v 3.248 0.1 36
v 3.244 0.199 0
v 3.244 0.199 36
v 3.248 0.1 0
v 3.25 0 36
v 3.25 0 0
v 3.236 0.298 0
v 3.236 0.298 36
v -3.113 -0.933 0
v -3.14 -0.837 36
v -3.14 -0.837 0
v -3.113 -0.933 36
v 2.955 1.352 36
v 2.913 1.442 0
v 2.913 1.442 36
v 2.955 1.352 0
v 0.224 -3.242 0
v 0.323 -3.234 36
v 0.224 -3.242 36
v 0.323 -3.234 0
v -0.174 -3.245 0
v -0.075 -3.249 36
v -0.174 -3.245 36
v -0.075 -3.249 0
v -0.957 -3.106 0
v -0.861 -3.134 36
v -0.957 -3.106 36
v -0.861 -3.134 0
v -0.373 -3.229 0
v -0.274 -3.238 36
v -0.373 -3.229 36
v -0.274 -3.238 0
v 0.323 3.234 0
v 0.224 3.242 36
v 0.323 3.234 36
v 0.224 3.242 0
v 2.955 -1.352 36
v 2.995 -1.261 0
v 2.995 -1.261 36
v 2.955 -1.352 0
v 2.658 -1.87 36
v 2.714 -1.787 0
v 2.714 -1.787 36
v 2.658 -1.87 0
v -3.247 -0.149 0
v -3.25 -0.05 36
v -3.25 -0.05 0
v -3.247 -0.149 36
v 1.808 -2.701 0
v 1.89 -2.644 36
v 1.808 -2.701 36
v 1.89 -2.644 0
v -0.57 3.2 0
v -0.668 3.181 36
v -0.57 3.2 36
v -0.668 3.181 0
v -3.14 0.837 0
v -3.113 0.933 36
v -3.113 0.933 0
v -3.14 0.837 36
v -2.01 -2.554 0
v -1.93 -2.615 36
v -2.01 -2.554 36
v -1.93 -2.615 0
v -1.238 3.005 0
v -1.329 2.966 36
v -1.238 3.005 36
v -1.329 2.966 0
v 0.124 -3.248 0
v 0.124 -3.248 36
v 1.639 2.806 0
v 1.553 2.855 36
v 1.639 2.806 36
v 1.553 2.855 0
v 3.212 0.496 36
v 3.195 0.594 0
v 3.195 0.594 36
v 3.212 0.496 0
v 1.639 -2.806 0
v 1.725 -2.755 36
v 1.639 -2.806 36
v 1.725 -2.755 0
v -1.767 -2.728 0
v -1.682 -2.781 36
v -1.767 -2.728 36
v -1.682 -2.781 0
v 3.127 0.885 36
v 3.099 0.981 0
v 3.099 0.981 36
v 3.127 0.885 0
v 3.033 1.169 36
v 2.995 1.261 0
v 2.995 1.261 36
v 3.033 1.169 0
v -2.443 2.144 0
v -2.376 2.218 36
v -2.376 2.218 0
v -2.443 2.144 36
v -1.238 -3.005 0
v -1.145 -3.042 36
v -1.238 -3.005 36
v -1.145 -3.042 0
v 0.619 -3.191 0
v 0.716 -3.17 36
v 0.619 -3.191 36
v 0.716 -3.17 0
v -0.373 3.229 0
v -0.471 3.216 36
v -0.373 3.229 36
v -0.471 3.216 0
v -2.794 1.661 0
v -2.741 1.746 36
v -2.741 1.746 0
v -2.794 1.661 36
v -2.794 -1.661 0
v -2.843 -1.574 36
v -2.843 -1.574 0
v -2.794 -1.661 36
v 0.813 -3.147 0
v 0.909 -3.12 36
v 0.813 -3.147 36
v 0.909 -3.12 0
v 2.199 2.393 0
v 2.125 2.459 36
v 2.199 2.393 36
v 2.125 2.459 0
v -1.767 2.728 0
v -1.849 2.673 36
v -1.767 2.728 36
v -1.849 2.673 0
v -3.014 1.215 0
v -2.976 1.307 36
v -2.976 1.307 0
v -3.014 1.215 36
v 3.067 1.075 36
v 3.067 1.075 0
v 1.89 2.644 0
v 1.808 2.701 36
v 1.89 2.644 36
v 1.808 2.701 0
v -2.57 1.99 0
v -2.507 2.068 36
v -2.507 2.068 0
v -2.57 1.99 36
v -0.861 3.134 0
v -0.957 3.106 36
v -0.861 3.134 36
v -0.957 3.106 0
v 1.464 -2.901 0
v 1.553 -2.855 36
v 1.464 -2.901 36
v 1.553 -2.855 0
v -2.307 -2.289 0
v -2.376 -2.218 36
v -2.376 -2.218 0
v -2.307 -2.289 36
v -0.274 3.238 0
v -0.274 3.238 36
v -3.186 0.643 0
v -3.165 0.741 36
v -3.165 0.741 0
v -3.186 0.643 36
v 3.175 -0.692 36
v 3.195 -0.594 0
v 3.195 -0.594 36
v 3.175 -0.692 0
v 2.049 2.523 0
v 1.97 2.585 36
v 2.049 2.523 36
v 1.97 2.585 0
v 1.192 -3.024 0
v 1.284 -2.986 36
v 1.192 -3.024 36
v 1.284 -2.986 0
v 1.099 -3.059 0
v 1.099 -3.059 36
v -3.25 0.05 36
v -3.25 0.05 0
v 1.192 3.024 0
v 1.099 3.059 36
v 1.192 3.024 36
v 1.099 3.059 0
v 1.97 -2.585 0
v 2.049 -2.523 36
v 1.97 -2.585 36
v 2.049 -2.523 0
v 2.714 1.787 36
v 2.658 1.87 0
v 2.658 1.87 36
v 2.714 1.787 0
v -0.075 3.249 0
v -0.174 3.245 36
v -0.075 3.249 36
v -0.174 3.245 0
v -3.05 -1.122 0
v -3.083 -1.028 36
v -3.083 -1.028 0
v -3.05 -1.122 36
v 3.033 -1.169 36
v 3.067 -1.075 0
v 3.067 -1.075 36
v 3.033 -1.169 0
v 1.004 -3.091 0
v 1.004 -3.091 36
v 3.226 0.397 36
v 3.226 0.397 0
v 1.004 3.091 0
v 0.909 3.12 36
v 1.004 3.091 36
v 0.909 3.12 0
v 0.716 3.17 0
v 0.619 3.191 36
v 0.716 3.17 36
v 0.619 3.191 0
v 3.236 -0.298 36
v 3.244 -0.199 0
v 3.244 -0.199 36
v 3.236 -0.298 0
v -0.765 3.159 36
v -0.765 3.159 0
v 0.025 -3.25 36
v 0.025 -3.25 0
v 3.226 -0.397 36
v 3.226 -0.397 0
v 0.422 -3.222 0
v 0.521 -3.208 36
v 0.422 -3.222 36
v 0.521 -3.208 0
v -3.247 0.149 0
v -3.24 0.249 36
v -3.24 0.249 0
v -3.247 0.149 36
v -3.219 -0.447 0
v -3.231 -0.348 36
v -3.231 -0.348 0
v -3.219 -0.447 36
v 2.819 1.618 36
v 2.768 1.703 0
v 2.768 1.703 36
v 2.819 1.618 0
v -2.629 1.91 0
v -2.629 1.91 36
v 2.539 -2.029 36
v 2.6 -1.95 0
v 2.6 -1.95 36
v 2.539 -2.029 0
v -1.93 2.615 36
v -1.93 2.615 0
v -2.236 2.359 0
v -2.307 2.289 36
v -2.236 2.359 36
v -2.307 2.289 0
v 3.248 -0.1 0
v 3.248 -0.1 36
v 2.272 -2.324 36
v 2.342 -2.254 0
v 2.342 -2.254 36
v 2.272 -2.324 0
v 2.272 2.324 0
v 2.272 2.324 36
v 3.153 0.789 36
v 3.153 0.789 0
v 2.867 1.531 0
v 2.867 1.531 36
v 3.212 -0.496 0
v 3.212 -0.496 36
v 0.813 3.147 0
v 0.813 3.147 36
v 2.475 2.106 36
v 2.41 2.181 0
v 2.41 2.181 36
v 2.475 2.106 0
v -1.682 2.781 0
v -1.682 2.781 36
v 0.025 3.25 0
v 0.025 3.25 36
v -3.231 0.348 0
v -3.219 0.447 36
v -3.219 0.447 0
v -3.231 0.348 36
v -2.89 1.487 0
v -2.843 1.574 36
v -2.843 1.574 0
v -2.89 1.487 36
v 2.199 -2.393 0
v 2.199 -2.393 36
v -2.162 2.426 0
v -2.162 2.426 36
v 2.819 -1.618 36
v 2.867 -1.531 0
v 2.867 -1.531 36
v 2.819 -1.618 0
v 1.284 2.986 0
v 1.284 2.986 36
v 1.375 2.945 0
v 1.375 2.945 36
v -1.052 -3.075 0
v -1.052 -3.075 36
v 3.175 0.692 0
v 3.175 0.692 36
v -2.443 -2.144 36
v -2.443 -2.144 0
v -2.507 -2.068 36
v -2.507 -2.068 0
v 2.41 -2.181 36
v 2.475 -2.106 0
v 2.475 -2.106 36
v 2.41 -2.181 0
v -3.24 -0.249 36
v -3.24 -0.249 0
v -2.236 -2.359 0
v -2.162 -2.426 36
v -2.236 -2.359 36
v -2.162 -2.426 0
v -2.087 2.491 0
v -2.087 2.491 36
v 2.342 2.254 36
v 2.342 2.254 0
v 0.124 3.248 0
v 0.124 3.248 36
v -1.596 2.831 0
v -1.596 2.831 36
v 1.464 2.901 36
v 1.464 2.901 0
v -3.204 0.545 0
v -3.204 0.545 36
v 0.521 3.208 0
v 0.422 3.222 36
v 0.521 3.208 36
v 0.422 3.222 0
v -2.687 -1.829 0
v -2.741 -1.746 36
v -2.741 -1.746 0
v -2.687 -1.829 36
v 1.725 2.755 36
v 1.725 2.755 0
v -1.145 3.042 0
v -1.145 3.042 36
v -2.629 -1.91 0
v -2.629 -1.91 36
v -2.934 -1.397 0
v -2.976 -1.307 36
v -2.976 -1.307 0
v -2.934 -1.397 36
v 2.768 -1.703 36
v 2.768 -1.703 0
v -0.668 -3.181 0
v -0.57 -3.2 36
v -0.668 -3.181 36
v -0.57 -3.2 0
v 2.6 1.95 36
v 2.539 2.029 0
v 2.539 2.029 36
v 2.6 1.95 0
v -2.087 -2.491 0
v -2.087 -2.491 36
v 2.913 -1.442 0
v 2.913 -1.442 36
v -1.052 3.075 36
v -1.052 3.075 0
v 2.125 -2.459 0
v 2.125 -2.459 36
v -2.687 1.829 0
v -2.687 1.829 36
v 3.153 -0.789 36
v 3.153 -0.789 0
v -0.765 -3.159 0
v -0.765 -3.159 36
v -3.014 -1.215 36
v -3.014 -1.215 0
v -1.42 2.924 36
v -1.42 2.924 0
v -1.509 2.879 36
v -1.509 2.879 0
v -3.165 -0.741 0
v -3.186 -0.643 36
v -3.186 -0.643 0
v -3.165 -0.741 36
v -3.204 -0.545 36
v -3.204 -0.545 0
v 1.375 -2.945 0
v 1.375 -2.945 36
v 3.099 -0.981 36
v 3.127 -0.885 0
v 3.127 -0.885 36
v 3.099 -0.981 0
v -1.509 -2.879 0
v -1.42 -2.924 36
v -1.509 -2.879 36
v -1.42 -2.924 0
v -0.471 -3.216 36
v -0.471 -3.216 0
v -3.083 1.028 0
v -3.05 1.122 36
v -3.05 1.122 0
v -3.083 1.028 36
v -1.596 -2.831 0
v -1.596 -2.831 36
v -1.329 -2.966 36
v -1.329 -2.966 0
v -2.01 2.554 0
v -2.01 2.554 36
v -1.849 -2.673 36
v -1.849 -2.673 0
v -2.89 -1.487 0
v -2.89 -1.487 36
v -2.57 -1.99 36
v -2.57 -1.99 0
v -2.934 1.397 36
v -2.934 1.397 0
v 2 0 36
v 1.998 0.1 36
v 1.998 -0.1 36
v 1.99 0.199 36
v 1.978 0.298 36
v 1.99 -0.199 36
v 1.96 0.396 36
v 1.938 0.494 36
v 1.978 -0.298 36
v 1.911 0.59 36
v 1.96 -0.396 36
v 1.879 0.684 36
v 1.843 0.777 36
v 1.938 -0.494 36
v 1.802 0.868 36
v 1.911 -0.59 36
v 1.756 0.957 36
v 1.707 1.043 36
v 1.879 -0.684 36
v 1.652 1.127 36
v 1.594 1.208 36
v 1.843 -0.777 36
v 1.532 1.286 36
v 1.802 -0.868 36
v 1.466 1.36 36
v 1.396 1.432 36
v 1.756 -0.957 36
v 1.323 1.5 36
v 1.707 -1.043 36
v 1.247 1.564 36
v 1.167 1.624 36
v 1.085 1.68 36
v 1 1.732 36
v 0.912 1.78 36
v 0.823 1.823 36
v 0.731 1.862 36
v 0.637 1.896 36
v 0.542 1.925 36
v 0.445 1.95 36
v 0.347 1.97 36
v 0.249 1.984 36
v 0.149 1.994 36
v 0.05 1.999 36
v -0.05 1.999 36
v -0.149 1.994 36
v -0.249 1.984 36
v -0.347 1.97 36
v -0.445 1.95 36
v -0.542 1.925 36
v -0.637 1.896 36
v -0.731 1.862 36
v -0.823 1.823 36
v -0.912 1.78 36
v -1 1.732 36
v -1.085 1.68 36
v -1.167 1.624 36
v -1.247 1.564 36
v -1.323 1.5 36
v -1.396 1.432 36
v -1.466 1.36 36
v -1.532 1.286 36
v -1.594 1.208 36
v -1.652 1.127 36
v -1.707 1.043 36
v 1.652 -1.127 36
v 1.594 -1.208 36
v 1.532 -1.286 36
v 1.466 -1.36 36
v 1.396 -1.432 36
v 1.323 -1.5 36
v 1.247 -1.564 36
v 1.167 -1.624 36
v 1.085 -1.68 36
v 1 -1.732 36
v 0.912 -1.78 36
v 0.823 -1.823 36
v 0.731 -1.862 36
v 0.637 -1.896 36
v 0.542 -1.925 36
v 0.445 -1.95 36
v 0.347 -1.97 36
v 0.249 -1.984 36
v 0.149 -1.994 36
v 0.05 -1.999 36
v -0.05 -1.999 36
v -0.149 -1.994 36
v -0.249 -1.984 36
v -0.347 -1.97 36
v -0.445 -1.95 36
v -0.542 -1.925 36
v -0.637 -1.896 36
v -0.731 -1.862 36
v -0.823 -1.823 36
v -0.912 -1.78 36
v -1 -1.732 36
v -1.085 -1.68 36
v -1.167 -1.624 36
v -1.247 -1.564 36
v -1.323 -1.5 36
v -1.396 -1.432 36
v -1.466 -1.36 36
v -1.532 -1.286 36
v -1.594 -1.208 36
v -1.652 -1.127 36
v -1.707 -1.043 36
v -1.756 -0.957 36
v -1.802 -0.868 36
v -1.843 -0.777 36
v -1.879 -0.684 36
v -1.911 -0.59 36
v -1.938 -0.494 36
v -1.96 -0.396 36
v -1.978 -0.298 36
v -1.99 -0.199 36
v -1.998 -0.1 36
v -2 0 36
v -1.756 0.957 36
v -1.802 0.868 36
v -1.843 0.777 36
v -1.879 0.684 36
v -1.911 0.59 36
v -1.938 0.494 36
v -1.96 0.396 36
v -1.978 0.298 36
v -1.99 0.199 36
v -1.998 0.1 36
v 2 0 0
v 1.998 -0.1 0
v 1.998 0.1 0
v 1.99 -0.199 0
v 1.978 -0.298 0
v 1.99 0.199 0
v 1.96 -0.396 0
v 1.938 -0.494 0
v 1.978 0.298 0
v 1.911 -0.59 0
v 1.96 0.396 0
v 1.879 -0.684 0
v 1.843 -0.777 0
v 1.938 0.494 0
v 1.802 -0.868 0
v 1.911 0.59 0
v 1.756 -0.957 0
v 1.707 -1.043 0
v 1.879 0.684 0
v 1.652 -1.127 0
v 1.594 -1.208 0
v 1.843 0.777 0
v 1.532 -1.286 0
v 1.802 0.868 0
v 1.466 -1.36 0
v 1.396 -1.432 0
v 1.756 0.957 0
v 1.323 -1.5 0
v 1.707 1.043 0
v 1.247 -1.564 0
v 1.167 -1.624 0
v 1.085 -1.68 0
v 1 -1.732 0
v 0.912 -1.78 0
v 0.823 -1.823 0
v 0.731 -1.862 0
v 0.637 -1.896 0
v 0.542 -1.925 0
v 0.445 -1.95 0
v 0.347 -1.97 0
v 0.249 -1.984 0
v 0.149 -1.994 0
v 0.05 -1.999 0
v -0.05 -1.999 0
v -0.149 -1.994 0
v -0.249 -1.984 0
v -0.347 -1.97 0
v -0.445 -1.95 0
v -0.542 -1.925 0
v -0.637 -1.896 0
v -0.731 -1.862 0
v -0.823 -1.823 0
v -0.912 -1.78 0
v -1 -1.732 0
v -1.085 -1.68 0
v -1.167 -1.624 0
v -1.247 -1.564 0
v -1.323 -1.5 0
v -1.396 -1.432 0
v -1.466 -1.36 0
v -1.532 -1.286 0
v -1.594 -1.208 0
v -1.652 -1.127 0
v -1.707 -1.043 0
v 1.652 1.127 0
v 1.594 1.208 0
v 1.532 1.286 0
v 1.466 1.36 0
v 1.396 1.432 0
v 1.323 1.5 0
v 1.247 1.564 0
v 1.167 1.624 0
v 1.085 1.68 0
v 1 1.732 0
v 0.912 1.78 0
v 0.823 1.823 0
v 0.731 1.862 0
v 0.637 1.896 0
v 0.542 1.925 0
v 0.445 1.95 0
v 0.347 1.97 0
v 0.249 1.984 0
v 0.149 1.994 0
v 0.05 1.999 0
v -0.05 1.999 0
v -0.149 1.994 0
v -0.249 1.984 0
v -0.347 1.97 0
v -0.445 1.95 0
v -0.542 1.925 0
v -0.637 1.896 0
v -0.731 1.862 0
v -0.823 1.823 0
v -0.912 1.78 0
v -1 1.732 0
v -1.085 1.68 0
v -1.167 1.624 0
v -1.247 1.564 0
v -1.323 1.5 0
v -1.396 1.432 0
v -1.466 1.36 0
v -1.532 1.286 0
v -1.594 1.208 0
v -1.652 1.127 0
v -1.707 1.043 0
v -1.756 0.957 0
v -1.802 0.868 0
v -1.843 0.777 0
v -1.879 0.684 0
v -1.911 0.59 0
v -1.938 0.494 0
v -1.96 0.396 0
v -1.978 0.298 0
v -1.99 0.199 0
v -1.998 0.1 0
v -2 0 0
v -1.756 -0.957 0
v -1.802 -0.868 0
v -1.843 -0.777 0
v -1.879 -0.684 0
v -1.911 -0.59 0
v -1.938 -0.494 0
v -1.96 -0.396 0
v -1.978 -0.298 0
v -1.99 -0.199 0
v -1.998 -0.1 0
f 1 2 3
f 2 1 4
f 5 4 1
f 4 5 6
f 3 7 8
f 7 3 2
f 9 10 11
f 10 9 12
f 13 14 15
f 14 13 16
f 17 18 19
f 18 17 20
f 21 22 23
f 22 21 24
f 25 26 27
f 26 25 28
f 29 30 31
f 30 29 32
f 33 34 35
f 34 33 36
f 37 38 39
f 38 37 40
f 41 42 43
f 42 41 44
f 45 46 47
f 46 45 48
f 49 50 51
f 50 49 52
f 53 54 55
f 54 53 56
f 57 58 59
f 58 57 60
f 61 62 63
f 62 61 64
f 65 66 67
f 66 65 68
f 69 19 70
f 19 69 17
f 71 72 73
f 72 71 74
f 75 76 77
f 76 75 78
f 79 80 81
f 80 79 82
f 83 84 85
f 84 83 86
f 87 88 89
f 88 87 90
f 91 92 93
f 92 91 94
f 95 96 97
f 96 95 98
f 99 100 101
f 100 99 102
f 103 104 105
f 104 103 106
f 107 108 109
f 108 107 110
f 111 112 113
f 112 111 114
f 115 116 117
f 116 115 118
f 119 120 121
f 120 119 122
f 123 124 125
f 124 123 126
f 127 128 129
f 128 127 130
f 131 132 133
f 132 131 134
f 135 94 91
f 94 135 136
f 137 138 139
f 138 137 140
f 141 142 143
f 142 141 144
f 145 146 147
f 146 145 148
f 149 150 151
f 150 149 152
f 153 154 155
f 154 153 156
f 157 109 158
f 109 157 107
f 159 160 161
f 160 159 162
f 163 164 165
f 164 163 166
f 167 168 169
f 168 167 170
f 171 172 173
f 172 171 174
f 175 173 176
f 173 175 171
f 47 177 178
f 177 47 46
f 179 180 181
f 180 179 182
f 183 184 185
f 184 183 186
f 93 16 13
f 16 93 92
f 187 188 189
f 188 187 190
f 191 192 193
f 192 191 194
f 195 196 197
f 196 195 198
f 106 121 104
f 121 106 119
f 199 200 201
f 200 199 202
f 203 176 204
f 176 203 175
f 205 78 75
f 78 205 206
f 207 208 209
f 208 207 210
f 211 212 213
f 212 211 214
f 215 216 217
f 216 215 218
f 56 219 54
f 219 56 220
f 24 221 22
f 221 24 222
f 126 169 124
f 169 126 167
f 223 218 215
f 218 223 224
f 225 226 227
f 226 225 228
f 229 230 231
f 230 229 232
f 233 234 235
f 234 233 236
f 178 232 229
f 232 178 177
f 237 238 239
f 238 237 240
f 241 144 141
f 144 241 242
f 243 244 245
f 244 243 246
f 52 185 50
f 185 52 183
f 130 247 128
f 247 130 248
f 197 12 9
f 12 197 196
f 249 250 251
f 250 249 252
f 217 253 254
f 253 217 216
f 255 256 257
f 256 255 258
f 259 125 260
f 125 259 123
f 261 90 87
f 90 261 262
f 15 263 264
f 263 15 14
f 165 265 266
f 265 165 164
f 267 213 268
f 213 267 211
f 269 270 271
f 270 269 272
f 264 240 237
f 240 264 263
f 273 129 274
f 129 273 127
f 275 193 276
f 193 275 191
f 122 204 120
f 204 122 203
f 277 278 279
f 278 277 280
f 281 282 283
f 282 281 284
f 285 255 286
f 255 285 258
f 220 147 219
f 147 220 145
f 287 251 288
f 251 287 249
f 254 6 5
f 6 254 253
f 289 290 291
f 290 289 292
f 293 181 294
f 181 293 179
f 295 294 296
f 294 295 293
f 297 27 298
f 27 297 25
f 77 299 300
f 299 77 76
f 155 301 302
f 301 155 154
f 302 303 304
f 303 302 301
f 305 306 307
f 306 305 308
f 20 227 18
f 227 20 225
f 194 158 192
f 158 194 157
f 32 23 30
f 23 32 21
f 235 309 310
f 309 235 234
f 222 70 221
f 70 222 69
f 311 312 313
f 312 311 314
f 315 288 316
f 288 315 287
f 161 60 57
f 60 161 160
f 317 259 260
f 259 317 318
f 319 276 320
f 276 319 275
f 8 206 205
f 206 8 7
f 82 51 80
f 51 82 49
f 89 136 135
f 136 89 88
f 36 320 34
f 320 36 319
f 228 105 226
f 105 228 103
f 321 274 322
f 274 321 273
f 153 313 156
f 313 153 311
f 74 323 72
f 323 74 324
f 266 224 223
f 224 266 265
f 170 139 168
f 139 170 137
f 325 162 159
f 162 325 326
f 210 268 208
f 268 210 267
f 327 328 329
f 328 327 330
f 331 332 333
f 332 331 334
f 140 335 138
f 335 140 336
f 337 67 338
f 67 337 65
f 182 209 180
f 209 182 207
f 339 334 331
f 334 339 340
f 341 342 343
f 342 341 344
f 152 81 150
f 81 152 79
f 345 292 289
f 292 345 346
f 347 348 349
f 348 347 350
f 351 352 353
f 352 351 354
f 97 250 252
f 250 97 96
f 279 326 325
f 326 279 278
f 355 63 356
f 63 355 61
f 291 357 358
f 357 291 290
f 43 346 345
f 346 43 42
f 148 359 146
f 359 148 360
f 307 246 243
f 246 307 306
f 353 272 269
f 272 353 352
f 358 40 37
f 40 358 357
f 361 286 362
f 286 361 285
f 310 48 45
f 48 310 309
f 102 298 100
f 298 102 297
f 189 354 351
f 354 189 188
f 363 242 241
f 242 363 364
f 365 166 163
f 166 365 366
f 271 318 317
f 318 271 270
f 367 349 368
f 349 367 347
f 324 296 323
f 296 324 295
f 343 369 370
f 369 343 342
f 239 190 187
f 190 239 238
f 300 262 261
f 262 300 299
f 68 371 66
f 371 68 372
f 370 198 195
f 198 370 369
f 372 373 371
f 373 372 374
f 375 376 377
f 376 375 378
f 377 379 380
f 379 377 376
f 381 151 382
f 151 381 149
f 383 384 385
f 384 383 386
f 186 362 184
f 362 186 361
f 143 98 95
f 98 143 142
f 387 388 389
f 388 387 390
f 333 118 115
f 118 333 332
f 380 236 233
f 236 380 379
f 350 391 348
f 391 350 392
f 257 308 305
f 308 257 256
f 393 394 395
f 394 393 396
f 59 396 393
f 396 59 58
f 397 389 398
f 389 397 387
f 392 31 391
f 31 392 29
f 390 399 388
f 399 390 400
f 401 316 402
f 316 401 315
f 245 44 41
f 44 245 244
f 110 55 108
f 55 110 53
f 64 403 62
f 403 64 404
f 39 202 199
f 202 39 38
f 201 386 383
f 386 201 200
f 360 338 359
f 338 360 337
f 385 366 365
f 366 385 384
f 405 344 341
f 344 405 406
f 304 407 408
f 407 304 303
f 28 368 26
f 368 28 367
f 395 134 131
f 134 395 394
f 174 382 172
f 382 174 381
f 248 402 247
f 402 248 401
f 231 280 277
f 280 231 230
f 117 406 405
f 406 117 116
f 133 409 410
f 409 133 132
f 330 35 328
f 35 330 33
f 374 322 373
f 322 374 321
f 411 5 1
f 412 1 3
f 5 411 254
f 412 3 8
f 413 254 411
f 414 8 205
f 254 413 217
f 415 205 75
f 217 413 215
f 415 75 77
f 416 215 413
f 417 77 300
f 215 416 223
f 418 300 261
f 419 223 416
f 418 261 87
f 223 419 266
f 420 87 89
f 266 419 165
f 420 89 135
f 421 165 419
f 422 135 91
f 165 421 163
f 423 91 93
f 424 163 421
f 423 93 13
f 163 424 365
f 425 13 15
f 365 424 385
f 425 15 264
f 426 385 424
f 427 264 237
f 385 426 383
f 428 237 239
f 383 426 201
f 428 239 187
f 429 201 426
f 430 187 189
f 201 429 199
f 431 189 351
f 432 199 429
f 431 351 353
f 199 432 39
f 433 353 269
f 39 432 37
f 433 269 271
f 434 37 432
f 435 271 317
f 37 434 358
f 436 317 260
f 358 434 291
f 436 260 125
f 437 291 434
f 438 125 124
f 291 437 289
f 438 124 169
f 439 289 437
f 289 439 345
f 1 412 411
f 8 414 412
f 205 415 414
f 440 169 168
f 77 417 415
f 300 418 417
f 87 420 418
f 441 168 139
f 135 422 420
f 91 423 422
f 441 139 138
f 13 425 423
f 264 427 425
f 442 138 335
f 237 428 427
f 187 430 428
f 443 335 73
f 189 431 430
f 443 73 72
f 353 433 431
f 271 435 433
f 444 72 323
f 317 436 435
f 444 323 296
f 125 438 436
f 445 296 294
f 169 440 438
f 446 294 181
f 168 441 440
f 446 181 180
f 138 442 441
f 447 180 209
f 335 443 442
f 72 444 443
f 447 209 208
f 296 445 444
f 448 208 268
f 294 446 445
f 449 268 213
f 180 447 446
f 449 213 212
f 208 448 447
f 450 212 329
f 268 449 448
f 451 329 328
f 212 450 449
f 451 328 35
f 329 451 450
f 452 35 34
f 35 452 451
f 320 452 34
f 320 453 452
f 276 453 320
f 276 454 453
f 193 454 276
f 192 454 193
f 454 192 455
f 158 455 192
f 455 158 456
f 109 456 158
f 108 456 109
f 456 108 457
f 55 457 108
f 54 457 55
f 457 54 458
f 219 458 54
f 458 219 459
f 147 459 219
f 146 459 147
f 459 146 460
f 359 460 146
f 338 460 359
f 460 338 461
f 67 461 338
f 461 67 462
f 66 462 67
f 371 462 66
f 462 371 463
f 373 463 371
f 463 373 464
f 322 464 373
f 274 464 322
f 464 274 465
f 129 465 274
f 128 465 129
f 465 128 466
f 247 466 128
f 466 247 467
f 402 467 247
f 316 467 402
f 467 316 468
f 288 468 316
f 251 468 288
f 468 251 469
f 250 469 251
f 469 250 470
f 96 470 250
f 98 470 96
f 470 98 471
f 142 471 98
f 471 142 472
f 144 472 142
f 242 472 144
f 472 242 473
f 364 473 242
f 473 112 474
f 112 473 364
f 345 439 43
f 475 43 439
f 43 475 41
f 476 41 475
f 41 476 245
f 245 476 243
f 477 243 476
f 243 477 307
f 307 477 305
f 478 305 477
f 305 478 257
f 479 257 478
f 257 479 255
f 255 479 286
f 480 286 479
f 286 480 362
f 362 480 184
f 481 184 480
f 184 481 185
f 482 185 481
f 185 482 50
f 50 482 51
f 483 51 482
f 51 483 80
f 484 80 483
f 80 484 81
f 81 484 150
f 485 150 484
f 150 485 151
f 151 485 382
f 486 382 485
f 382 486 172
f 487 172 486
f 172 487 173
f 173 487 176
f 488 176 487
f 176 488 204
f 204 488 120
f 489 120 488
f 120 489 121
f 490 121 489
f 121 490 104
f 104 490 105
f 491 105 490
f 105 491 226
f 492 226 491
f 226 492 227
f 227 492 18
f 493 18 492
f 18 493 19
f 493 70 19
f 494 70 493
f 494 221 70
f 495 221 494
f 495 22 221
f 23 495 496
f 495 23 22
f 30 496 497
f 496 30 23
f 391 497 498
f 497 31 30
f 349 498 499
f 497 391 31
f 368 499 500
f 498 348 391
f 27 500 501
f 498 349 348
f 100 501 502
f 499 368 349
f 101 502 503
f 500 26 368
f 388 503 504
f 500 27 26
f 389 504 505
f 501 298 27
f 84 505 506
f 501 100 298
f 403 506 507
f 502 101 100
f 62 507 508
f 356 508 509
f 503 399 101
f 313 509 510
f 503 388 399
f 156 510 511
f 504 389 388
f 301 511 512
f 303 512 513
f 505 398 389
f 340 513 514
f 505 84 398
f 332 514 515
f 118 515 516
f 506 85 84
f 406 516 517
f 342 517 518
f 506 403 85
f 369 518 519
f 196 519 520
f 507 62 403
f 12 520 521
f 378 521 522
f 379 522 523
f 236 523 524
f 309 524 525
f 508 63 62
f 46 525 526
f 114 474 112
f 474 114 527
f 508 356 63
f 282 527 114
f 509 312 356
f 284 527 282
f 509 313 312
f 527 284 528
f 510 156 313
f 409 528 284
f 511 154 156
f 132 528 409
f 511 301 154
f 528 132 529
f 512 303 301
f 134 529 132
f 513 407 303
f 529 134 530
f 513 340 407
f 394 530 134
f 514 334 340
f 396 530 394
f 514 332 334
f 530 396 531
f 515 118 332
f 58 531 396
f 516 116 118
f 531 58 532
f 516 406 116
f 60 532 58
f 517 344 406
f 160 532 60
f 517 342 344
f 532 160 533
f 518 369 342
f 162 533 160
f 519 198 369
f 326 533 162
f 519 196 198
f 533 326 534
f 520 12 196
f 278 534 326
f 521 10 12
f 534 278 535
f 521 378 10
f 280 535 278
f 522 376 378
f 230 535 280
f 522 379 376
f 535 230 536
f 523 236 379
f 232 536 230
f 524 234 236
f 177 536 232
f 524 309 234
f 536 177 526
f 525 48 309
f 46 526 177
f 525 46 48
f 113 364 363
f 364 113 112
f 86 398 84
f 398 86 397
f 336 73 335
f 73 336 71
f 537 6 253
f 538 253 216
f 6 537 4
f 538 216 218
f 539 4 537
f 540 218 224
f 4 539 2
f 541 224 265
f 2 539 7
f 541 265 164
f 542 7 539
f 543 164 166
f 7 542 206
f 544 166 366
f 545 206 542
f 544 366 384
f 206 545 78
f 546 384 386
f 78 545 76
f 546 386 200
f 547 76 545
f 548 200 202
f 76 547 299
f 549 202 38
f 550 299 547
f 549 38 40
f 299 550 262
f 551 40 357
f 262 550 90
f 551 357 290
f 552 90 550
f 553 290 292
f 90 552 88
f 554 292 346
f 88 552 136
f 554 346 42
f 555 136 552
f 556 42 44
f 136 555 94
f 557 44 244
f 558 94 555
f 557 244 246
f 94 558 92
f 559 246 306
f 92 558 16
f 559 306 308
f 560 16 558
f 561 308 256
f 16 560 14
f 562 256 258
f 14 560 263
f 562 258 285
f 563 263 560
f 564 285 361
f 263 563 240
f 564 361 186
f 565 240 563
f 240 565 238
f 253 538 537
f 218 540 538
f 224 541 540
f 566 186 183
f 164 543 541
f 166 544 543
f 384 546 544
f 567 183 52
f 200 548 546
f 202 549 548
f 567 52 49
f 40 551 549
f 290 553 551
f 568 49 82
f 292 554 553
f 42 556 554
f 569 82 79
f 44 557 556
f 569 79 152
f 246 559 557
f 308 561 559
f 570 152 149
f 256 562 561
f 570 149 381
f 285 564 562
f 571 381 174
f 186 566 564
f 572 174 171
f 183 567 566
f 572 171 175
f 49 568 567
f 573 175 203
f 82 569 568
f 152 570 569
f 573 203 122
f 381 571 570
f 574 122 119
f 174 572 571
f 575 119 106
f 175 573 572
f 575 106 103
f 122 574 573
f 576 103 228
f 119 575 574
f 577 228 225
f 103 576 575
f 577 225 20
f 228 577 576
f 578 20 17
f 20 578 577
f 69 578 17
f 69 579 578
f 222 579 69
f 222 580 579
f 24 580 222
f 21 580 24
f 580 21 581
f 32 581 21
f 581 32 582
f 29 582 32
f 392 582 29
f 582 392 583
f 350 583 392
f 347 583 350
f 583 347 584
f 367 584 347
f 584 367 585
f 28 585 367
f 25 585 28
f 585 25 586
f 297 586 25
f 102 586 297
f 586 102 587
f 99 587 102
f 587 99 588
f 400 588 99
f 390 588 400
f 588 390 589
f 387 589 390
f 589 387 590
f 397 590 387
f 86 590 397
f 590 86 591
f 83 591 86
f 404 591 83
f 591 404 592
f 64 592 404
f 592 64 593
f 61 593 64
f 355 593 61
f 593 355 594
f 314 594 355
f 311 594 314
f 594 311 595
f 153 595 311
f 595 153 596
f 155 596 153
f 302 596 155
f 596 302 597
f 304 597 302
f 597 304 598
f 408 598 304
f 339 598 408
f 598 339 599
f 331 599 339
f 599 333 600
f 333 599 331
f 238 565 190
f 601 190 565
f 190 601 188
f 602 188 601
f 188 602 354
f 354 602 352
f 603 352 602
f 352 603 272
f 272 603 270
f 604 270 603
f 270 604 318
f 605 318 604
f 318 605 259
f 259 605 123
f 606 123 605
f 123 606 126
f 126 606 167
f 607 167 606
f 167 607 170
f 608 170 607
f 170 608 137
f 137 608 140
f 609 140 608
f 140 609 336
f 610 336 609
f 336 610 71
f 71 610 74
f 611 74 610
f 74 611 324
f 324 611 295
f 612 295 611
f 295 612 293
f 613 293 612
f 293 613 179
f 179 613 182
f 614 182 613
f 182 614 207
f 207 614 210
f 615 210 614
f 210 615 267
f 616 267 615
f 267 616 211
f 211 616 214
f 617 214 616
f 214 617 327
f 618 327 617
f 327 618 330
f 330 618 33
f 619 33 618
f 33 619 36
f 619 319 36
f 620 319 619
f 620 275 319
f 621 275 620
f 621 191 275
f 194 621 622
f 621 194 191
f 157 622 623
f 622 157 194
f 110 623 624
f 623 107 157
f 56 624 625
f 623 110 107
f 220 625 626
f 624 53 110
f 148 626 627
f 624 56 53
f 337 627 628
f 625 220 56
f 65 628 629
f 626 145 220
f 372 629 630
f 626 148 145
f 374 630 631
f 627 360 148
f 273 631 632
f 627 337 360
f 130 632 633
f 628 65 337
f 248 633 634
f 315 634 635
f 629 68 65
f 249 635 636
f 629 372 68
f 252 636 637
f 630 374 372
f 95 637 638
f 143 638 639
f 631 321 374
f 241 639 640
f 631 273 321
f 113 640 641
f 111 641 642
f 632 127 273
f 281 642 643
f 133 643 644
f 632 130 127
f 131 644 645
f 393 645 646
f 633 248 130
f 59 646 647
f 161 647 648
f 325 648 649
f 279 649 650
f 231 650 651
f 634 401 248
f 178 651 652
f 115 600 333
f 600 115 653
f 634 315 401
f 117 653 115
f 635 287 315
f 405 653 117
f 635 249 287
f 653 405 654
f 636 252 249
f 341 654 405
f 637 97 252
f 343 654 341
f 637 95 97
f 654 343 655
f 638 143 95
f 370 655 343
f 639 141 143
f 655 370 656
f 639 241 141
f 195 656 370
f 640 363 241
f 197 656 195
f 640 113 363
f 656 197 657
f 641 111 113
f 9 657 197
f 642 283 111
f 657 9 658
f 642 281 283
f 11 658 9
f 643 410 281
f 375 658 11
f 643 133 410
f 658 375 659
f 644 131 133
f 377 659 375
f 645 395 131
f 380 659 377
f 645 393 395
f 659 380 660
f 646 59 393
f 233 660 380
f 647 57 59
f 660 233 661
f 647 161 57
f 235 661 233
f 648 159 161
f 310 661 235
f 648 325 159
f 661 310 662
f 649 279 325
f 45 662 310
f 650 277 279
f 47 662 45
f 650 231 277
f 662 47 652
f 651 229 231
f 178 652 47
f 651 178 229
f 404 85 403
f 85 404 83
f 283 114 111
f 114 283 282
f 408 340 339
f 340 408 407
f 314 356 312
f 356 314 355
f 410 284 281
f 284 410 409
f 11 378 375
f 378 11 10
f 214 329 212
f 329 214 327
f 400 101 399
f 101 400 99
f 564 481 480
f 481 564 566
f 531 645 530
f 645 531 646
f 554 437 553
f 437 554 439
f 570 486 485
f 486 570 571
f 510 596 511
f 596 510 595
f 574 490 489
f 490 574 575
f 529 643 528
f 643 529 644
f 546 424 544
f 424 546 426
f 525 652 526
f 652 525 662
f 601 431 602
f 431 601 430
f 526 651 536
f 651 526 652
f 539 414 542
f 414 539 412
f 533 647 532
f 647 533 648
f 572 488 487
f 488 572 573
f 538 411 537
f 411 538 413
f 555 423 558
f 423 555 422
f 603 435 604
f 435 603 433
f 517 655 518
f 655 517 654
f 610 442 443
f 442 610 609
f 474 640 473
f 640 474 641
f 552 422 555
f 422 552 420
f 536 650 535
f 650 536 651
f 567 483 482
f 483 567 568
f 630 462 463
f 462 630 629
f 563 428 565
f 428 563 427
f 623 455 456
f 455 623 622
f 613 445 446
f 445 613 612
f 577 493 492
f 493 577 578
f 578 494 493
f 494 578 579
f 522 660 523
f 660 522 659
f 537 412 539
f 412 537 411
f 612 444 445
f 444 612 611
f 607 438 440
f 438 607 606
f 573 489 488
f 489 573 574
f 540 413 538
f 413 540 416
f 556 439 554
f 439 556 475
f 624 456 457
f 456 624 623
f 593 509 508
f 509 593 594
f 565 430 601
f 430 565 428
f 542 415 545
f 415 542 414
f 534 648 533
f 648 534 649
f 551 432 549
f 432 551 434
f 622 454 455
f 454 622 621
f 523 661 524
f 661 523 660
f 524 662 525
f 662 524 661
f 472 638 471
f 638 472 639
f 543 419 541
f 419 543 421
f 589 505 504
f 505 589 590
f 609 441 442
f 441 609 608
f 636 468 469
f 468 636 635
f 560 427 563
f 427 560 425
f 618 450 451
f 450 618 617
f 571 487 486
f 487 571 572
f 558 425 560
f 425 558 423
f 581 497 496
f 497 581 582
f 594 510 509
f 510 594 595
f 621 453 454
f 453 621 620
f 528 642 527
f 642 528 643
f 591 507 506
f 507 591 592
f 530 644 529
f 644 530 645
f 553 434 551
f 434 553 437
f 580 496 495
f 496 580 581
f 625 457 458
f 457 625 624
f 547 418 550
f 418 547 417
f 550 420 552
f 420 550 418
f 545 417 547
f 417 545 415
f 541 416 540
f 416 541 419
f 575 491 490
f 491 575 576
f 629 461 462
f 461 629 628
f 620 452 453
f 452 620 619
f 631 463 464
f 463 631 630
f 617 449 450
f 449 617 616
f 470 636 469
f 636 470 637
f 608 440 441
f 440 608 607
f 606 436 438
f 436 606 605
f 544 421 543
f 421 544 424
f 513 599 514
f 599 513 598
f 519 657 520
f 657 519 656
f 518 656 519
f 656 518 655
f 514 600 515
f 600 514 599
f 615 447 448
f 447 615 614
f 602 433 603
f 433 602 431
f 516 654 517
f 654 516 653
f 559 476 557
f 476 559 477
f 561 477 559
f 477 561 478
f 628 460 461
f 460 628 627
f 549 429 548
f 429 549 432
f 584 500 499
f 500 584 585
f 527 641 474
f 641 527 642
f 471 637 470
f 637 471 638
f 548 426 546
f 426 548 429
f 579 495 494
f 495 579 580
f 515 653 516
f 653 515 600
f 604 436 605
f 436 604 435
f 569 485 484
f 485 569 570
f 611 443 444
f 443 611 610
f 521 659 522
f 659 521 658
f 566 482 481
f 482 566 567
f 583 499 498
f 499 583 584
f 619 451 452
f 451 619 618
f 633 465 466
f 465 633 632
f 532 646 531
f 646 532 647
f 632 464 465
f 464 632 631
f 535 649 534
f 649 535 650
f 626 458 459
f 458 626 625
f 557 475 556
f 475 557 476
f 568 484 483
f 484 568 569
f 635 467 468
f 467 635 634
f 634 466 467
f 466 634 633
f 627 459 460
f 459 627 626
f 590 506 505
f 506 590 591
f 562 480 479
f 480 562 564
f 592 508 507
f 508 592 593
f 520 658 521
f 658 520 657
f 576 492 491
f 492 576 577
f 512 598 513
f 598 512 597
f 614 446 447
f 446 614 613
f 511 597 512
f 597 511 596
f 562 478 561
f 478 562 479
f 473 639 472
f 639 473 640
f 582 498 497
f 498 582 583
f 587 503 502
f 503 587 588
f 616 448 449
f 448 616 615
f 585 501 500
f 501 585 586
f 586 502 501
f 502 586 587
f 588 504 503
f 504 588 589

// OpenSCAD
$fa = 0.1;
$fs = 0.1;

difference(){
    cylinder(d = 6.5, h= 36);
    translate([0,0,-1]){
        cylinder(d = 4, h= 38);
    }
}
